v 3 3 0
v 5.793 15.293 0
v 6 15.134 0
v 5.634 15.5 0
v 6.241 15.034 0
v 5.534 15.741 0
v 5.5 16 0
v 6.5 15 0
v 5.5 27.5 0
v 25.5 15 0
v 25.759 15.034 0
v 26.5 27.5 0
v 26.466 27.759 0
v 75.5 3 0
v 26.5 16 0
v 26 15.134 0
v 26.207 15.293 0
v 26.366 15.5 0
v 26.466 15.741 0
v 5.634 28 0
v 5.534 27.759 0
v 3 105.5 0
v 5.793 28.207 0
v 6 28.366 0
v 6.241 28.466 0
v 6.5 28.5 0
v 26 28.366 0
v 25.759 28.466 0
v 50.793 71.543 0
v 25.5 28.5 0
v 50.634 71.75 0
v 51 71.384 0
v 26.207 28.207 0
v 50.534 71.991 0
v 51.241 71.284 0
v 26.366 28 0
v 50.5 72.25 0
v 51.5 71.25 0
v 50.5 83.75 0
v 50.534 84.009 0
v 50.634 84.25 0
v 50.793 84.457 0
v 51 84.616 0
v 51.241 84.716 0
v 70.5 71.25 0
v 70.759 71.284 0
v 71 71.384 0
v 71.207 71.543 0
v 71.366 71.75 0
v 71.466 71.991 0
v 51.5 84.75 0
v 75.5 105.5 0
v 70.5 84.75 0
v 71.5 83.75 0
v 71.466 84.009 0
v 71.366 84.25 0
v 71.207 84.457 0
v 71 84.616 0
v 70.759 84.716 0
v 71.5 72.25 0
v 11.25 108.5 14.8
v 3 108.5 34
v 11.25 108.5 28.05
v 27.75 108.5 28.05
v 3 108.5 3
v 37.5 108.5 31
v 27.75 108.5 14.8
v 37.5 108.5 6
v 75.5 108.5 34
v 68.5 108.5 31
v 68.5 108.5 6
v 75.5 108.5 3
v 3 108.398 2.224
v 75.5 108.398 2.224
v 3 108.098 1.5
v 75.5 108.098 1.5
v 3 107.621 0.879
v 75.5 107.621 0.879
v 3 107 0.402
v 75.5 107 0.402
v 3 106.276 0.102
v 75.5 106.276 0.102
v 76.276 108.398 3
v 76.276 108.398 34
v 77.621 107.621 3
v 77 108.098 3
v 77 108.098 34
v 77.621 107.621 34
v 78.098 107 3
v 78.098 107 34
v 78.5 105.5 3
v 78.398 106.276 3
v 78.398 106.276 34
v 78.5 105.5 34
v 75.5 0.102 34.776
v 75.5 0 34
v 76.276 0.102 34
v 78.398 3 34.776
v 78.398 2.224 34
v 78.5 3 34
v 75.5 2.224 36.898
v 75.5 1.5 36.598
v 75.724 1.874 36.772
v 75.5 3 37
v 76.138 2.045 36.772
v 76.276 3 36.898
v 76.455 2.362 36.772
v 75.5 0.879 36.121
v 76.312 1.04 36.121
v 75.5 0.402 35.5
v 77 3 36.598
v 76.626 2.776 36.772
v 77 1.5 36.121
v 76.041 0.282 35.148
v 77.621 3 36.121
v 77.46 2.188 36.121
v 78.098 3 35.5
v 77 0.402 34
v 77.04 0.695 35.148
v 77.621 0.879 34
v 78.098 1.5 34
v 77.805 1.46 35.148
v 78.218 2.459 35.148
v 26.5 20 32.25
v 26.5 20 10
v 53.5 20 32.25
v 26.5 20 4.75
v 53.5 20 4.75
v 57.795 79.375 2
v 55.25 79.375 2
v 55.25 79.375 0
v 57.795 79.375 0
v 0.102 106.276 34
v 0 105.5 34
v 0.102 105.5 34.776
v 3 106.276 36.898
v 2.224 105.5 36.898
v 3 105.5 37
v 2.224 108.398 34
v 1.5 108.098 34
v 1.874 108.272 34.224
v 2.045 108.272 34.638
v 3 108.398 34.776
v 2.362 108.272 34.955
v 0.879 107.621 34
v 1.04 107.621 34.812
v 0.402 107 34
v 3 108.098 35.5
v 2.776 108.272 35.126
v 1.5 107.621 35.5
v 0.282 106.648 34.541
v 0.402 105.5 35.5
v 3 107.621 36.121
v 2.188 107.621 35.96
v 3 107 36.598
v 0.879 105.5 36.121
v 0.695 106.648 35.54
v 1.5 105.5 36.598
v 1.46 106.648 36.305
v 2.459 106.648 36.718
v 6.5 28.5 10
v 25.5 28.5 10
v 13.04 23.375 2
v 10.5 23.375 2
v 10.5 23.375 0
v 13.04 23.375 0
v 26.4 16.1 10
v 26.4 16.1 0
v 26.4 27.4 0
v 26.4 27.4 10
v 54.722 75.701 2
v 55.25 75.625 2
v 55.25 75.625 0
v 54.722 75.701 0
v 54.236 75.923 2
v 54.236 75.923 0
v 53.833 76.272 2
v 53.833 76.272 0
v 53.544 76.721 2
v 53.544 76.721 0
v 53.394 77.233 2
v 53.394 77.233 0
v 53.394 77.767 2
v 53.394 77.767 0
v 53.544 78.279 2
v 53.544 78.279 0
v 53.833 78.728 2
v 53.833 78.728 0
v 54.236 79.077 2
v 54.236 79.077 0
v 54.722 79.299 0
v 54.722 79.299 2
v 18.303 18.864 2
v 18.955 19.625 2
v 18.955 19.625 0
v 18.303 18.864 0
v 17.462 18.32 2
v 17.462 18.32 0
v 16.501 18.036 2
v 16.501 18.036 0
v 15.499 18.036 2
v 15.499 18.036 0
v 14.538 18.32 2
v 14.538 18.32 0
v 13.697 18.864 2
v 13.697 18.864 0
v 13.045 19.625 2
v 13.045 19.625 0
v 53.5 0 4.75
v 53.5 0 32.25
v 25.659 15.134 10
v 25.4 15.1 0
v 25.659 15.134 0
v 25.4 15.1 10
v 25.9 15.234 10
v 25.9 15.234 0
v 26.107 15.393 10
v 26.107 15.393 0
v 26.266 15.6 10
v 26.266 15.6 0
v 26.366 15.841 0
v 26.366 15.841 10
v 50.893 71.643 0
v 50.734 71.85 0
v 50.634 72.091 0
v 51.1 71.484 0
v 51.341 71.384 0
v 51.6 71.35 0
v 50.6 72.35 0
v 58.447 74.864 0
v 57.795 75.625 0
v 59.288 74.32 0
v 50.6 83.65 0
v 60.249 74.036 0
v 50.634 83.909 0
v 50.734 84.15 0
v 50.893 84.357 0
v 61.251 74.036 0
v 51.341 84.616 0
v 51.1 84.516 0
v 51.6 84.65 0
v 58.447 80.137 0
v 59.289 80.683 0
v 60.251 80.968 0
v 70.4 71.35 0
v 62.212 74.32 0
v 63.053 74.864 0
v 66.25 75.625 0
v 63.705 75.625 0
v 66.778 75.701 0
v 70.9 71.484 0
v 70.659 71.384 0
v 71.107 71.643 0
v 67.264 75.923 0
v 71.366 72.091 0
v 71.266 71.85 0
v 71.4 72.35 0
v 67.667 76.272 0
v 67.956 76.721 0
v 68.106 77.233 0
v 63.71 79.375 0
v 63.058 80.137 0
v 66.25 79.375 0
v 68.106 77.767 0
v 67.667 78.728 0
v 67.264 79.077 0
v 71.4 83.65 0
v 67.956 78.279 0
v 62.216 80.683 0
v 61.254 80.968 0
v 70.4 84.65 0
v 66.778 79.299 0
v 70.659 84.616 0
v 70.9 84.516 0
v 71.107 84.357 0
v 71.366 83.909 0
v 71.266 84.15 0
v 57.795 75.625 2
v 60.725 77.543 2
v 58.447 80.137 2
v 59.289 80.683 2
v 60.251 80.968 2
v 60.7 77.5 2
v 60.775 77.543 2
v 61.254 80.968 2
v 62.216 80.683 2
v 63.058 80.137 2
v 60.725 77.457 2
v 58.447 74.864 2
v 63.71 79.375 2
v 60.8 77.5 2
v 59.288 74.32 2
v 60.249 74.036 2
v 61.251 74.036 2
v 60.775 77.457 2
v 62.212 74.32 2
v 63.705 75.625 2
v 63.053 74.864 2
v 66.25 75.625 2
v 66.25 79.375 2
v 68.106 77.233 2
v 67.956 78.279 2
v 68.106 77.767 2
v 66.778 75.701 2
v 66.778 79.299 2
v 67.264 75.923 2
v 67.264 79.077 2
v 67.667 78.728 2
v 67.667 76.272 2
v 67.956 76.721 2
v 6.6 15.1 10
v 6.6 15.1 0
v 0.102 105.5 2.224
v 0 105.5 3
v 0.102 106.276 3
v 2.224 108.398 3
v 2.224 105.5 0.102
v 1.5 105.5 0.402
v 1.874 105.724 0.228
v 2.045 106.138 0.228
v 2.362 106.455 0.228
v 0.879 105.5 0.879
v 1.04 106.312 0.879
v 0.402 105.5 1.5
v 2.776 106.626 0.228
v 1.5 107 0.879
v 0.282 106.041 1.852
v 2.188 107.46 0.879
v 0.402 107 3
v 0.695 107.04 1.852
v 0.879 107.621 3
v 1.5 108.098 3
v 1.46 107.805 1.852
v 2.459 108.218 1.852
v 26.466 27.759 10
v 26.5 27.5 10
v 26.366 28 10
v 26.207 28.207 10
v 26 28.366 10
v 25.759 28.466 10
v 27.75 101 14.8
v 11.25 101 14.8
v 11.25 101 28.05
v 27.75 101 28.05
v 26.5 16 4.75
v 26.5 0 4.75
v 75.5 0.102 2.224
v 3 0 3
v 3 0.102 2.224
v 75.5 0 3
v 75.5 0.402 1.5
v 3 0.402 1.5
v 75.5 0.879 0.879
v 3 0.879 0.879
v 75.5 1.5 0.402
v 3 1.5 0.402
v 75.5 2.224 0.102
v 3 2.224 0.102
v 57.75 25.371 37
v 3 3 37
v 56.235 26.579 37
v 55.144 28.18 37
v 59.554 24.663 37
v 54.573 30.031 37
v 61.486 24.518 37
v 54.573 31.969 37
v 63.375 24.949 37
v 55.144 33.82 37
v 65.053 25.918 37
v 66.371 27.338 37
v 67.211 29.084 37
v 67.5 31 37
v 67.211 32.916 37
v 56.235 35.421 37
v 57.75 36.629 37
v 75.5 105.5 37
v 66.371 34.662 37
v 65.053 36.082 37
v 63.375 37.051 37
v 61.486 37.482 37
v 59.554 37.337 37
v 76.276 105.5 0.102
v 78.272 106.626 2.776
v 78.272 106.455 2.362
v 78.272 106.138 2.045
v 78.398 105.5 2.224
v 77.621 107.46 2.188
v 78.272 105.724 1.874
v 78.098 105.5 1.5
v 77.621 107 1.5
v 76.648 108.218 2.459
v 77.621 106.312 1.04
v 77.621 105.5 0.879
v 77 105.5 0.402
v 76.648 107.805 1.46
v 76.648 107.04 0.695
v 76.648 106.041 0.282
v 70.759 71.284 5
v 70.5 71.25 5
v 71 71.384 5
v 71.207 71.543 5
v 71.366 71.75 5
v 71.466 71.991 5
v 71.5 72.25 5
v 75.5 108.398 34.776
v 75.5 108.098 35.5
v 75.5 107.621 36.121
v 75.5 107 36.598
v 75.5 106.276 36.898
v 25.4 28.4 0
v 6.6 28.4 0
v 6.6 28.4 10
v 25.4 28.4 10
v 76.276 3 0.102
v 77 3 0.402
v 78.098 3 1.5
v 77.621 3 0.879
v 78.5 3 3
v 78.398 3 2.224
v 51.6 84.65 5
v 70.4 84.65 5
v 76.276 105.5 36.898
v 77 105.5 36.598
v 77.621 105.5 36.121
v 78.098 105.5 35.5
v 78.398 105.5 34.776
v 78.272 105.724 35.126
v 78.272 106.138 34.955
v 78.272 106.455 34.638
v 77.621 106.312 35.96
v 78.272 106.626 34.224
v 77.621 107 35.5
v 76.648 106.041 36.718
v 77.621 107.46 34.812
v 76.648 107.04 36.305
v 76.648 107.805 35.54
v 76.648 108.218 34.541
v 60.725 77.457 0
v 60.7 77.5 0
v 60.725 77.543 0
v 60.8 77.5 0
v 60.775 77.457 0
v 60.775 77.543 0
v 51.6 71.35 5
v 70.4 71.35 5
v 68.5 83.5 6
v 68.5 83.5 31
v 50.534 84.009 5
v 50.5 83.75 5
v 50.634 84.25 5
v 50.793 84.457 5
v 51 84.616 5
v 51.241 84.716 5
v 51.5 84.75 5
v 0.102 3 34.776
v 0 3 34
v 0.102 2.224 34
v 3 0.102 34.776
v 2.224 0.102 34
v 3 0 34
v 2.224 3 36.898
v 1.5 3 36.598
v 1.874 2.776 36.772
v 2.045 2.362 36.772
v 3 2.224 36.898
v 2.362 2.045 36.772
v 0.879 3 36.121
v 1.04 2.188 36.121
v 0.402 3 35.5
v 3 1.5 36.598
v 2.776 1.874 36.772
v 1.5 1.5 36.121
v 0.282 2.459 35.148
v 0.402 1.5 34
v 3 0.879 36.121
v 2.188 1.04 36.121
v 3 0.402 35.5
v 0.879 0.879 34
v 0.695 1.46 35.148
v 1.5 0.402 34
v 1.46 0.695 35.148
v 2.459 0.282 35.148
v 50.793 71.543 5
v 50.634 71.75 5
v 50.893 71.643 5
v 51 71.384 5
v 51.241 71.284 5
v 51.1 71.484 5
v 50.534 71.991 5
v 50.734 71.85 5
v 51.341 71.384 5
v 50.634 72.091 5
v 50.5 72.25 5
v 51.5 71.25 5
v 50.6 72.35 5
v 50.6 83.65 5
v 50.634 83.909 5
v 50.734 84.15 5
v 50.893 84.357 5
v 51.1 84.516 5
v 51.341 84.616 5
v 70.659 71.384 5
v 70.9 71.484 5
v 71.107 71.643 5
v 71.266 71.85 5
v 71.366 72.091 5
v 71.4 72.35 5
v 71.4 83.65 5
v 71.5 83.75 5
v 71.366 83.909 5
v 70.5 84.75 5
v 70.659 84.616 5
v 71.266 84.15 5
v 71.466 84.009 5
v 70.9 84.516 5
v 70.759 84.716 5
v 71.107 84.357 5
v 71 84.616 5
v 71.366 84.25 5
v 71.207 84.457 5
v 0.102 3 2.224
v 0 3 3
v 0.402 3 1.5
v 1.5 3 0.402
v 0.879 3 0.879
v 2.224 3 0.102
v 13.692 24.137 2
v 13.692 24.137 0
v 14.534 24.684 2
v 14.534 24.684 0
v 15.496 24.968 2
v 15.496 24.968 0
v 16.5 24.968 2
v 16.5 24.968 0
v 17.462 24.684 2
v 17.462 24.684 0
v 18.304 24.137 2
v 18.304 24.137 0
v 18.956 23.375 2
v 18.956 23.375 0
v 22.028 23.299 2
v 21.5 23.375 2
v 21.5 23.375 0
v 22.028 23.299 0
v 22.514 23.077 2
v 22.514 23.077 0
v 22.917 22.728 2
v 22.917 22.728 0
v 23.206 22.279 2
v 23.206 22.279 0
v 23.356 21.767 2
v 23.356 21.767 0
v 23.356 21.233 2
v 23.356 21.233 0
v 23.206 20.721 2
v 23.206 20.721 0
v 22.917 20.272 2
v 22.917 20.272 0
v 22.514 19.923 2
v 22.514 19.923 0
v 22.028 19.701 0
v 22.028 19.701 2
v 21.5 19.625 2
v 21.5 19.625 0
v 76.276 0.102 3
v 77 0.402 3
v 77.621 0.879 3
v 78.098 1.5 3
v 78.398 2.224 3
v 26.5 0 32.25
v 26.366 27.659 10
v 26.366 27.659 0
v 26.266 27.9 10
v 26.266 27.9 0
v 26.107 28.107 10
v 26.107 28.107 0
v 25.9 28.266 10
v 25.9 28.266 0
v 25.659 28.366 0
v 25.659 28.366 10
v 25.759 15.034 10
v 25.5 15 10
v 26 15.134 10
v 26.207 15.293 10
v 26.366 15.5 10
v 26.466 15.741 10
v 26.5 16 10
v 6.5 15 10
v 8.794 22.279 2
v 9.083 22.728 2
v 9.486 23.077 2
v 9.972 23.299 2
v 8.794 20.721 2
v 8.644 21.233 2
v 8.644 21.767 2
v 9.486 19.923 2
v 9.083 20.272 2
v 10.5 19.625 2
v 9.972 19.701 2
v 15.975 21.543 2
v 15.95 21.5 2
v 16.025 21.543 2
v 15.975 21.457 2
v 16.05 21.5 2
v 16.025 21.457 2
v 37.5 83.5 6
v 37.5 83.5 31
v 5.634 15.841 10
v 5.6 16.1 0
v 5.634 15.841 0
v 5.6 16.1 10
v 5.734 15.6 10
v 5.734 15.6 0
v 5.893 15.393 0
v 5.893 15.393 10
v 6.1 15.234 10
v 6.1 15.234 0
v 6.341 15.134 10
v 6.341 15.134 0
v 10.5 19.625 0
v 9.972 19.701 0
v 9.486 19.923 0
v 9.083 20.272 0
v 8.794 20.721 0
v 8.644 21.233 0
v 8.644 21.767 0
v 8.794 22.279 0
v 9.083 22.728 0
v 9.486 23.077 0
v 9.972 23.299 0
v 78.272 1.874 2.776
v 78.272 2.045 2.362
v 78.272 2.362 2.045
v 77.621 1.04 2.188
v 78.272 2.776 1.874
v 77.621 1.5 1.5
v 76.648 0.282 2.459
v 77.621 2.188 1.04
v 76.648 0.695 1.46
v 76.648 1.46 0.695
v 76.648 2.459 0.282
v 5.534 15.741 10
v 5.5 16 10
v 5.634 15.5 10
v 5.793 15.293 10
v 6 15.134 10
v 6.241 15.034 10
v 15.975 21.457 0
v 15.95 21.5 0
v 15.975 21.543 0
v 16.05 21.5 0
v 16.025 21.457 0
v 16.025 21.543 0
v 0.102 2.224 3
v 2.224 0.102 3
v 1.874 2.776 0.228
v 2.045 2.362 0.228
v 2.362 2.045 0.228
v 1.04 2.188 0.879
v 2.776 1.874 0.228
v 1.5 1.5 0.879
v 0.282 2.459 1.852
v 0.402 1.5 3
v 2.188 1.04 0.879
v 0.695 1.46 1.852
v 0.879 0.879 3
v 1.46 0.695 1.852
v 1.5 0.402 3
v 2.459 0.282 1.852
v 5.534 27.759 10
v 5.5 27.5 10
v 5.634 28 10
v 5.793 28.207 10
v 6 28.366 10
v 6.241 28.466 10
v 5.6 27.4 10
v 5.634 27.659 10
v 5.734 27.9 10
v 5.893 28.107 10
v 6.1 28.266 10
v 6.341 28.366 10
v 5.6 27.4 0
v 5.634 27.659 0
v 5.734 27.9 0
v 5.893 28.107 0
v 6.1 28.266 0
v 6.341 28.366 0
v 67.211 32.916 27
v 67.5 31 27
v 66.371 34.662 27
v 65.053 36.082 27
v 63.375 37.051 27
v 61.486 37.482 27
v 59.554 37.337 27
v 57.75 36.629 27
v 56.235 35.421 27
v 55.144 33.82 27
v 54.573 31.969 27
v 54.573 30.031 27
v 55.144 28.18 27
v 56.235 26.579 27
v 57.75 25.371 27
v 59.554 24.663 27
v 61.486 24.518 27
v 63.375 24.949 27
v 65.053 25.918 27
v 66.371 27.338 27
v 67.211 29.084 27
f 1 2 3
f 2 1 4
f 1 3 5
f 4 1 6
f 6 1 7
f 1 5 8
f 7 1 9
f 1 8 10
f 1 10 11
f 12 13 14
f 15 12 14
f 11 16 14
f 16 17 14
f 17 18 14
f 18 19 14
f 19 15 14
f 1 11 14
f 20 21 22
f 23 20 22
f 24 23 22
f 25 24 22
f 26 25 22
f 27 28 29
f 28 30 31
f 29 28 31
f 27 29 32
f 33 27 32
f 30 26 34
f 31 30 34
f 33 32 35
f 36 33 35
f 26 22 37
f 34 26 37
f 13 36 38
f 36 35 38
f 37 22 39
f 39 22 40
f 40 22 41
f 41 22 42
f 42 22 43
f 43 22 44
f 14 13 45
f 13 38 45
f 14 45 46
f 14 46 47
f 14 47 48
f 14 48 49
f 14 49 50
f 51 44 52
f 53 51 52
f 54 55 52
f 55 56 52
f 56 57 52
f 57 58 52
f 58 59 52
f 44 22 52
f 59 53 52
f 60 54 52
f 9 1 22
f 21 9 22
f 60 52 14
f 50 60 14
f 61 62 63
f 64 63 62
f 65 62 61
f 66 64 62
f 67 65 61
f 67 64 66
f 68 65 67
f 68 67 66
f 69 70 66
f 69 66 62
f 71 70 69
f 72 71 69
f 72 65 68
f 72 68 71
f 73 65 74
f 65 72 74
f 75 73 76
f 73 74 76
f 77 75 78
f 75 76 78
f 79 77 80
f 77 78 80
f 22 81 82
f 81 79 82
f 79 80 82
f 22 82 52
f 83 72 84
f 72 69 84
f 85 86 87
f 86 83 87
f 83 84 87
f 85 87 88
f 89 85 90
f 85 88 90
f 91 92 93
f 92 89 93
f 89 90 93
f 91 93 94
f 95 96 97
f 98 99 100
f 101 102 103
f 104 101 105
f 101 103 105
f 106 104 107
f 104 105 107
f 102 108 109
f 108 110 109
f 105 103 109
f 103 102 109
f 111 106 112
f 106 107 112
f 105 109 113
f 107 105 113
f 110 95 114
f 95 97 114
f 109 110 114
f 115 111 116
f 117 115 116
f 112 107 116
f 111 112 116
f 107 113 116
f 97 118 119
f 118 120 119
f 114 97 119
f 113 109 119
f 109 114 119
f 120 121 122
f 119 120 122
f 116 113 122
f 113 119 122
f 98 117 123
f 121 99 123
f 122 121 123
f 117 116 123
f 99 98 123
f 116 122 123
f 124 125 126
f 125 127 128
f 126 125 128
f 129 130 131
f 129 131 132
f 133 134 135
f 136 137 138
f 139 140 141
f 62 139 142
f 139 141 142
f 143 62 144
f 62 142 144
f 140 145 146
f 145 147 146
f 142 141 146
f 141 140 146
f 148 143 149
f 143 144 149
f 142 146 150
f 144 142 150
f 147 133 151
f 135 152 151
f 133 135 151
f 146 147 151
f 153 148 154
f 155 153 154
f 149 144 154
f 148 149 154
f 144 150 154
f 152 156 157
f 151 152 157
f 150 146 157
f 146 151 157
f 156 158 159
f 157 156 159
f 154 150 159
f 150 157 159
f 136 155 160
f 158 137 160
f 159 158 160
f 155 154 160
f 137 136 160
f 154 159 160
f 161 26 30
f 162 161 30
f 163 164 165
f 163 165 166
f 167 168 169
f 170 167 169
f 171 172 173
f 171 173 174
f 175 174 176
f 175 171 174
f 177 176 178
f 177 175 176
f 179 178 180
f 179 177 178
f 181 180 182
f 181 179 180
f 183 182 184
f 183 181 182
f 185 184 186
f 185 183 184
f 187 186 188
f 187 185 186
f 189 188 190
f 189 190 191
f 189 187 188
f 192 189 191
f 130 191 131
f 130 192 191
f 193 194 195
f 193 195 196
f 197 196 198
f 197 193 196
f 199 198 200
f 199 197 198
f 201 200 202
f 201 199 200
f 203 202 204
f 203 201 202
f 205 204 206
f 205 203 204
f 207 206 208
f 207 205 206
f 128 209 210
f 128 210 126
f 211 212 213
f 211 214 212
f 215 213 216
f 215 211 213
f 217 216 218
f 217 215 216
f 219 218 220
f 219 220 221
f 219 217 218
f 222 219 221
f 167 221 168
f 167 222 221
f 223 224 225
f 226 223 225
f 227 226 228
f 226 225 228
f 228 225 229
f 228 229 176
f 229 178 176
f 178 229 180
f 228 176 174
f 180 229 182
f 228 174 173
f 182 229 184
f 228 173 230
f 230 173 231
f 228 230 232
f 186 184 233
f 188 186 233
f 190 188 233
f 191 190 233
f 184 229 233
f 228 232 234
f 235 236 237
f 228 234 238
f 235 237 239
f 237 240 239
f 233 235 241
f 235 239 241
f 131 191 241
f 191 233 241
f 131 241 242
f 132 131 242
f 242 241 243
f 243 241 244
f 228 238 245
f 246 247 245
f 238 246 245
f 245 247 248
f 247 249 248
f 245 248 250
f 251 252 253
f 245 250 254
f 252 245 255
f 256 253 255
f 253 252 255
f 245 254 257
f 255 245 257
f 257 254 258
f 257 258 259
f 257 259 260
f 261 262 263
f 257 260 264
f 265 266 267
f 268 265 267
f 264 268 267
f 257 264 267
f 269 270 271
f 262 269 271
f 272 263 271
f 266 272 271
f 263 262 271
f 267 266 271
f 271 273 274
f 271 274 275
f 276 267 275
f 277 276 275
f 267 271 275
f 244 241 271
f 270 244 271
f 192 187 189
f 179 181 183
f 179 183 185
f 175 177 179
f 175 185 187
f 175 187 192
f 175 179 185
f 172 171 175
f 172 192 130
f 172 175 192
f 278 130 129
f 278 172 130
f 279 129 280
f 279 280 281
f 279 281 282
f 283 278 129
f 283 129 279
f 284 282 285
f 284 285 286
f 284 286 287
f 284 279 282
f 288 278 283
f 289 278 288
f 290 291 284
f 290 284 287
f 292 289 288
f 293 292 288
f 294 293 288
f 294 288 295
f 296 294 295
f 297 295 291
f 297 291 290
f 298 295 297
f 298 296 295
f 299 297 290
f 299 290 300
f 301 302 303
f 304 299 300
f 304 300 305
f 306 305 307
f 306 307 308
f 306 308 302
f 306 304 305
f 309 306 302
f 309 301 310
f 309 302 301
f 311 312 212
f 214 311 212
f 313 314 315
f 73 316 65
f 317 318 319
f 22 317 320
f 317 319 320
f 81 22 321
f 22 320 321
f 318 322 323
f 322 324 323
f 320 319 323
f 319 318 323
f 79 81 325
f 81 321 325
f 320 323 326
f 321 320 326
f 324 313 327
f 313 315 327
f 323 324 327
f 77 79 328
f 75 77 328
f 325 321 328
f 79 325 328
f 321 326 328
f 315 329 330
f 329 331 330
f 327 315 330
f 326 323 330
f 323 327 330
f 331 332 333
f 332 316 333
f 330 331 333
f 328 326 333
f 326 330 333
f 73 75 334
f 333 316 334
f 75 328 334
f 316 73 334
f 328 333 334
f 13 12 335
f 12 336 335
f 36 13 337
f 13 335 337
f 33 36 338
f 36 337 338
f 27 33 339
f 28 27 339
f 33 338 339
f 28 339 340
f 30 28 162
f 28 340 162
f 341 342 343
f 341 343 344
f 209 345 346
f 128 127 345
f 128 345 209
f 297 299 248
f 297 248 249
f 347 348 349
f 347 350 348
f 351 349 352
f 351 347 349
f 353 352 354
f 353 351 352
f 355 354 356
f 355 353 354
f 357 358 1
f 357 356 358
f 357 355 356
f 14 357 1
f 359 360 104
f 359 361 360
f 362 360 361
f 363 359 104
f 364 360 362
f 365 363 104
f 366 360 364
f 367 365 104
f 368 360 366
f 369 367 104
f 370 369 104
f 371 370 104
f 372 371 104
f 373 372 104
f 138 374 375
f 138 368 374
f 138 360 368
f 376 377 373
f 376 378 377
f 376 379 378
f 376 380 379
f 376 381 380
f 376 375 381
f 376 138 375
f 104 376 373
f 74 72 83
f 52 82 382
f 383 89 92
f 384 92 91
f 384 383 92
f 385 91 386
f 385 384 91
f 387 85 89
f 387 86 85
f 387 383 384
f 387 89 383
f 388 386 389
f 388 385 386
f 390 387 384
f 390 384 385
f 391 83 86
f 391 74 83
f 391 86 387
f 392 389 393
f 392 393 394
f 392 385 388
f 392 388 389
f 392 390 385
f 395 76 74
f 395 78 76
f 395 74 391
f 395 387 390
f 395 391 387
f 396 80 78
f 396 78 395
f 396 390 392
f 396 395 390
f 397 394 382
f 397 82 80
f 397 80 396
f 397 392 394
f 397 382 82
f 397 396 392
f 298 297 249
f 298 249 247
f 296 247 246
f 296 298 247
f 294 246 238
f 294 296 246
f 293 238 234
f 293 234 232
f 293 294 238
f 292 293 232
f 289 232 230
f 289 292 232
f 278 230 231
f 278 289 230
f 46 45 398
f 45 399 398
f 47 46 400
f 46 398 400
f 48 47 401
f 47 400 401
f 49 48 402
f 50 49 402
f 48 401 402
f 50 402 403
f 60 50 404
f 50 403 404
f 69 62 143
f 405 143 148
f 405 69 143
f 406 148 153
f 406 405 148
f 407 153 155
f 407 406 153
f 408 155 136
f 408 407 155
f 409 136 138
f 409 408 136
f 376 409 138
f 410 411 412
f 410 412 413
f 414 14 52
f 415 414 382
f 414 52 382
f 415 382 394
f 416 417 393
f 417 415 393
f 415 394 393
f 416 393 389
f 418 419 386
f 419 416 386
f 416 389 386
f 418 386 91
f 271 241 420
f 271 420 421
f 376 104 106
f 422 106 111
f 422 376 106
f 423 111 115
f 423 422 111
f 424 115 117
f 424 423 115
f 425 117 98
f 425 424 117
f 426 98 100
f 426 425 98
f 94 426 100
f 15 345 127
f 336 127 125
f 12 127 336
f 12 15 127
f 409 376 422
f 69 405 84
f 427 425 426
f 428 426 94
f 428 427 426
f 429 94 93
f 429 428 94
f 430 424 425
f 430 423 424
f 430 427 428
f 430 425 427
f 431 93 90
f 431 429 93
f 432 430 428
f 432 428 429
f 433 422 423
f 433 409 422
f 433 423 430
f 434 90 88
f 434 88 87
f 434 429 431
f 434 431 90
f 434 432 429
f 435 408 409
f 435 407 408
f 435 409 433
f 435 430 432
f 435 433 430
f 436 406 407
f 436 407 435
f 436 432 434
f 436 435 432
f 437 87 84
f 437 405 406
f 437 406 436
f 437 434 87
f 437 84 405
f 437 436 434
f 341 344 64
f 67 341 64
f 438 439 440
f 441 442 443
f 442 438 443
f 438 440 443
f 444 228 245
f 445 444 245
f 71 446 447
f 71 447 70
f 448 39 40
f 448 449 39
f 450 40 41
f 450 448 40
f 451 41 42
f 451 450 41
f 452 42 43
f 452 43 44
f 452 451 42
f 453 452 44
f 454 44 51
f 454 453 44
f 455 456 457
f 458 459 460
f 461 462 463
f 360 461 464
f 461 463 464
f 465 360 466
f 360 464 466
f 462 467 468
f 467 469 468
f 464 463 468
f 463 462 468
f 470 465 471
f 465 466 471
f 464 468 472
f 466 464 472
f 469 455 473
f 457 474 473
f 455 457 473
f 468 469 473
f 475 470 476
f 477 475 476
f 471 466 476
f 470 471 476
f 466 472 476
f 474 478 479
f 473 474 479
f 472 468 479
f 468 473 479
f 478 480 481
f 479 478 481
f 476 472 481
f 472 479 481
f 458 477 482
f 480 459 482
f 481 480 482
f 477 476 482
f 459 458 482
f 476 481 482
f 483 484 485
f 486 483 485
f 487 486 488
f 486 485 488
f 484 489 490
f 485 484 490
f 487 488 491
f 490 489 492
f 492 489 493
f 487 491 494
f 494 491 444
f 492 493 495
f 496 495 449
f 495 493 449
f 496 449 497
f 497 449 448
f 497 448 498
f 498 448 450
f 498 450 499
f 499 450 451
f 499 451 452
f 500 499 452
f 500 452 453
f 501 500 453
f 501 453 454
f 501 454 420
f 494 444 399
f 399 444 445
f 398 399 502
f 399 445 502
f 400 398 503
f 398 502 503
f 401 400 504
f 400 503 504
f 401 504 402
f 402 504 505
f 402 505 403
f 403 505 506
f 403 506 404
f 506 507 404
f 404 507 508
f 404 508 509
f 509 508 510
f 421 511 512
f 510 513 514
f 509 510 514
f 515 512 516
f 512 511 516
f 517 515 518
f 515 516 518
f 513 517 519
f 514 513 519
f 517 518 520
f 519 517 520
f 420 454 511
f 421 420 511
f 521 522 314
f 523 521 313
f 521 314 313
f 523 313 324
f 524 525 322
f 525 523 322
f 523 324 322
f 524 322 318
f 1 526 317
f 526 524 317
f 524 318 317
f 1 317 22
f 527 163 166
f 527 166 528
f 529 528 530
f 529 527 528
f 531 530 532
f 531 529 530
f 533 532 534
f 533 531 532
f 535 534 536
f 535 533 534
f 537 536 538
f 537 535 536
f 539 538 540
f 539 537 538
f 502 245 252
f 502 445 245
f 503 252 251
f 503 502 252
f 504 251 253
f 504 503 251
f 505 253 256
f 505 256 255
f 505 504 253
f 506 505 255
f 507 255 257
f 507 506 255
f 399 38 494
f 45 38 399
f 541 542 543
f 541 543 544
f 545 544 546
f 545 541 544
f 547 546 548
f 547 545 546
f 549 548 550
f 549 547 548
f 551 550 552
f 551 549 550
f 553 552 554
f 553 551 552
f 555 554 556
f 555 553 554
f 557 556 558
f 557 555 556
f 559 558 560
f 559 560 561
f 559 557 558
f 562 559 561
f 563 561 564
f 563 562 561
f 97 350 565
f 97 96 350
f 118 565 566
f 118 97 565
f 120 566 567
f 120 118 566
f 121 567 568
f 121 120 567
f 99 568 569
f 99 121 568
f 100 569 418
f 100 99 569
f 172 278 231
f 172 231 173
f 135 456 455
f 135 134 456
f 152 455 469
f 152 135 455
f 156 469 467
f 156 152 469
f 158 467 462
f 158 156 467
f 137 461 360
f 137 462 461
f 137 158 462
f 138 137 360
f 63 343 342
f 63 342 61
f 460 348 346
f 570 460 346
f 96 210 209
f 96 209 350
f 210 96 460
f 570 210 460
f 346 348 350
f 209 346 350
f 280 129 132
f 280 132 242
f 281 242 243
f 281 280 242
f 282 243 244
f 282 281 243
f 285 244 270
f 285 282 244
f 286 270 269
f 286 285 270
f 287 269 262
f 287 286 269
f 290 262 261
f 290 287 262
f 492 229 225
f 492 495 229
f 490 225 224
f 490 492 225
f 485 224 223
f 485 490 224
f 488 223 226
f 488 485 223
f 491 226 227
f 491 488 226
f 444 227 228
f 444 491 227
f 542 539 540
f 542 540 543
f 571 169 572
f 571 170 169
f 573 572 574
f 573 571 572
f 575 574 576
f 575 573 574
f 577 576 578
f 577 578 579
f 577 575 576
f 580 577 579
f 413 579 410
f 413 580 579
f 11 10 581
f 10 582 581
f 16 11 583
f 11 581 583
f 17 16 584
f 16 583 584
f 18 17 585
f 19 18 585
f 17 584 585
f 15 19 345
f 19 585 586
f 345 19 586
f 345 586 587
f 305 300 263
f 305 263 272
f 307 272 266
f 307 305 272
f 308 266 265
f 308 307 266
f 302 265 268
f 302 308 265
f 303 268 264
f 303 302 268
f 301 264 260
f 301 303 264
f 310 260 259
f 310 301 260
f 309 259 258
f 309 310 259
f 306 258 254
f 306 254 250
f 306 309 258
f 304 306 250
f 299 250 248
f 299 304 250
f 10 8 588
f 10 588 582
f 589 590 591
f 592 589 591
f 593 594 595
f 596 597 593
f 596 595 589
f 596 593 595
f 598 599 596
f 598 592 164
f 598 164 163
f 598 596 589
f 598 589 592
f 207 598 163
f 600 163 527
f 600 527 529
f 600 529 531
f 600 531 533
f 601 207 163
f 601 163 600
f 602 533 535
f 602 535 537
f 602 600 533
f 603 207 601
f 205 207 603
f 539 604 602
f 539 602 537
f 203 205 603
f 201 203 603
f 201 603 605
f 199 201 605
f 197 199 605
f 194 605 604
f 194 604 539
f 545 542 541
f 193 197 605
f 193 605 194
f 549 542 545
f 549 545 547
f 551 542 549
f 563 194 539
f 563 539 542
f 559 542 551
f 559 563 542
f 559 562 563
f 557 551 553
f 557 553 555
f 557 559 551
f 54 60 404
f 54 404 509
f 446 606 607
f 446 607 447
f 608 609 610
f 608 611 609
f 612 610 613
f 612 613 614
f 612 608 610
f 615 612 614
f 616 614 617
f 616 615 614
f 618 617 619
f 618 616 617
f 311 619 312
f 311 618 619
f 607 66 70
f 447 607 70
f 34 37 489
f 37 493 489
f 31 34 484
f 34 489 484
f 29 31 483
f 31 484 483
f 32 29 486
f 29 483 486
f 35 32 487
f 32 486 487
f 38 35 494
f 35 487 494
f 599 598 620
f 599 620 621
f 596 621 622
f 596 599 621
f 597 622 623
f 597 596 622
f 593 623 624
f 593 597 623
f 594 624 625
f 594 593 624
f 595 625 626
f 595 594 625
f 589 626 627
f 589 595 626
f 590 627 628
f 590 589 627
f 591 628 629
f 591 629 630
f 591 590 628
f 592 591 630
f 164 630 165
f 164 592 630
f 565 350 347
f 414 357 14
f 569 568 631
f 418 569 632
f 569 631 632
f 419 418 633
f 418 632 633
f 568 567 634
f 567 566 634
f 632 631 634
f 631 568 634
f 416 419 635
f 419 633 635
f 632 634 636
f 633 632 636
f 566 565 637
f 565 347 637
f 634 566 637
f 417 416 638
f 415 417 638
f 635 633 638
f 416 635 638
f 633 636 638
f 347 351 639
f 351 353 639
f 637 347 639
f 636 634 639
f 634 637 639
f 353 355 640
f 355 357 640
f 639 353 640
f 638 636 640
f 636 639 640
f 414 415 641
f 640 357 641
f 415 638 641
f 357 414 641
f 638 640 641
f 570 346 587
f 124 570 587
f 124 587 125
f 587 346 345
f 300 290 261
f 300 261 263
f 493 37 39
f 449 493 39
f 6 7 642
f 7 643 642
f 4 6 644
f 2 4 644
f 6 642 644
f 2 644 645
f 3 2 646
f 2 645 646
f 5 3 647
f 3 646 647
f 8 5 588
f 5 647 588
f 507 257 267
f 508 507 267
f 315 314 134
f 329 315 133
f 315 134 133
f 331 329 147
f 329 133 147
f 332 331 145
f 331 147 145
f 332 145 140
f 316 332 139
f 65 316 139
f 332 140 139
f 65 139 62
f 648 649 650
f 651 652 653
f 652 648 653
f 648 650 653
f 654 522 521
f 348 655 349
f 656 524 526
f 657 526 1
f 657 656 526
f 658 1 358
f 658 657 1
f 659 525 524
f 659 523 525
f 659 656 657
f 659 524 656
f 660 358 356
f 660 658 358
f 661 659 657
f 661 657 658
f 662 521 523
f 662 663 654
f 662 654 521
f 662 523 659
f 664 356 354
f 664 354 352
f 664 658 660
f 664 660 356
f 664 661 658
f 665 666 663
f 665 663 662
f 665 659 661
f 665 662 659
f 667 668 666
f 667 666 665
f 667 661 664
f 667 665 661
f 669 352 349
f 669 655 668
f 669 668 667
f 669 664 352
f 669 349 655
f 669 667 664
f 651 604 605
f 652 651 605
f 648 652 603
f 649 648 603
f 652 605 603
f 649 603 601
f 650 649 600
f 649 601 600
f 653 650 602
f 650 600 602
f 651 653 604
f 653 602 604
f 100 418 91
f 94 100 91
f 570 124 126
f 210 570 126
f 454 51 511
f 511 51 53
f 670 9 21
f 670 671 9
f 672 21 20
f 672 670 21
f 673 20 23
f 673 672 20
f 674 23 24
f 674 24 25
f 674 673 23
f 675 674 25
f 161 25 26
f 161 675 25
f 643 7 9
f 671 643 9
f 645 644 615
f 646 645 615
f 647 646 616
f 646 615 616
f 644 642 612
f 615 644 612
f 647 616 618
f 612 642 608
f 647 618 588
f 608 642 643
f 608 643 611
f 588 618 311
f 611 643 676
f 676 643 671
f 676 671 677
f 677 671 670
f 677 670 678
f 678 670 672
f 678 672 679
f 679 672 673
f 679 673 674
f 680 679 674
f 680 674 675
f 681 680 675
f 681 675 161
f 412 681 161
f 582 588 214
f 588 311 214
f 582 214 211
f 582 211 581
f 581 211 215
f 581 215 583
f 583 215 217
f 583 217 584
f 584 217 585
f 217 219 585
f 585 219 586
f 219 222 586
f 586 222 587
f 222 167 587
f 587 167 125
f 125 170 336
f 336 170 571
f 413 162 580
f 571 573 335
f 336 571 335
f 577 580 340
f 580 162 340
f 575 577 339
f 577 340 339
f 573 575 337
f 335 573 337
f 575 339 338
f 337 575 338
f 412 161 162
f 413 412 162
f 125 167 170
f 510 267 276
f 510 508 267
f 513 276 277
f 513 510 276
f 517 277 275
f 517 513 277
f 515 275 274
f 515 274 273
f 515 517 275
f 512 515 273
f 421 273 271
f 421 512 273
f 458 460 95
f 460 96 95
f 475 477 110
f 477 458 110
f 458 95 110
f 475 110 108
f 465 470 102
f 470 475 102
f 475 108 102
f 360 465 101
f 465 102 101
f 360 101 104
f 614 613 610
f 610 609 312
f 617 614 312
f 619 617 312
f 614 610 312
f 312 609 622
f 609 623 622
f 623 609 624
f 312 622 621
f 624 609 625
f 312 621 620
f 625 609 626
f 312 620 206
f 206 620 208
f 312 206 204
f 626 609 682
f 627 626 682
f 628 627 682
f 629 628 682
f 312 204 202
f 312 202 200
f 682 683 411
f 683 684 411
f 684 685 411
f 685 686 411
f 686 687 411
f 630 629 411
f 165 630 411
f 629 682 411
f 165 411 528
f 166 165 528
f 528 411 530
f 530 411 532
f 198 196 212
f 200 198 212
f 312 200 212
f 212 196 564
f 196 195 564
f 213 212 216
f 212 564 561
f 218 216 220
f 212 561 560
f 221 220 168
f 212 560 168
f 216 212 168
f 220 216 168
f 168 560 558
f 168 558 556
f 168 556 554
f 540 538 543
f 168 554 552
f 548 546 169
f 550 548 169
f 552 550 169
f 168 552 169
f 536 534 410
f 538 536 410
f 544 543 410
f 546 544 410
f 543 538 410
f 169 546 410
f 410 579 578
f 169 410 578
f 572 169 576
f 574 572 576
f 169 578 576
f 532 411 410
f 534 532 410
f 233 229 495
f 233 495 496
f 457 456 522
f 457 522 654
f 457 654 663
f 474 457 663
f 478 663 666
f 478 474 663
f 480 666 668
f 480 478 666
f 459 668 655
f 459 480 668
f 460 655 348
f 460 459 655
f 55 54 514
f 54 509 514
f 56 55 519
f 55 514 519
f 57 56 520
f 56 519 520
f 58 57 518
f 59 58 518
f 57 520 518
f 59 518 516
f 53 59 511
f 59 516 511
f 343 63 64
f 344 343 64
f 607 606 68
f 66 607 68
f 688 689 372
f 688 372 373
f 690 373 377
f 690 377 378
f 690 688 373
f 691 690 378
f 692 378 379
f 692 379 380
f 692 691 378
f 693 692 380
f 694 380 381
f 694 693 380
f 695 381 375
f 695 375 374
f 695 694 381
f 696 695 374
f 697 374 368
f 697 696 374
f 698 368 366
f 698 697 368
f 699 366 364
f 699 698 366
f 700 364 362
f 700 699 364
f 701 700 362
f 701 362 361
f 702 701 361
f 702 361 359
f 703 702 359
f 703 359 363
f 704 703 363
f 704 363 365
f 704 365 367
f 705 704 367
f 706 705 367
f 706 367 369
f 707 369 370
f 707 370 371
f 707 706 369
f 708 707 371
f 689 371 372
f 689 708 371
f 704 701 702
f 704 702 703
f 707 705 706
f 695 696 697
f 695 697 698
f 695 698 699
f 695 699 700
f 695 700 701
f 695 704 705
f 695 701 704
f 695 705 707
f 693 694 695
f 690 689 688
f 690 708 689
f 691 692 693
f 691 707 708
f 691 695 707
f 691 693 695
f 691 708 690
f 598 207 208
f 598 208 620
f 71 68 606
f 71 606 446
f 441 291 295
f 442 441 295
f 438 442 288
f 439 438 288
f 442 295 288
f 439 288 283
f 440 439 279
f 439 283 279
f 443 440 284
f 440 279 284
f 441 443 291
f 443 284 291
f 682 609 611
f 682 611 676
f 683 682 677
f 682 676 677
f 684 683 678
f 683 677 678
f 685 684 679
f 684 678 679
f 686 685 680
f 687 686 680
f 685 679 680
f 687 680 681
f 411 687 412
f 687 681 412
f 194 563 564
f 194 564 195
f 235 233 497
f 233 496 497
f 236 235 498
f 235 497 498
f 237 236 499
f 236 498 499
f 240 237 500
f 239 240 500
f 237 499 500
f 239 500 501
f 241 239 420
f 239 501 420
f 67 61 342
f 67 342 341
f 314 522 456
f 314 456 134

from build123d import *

# Parameters (mm, degrees)
SKETCH001_R       = 0.05
EXTRUDE001_DEPTH  = 2
BOX017_W          = 21
BOX017_H          = 13.5
BOX017_DEPTH      = 5
FILLET006_R       = 1
BOX007_W          = 21
BOX007_H          = 13.5
BOX007_DEPTH      = 10
FILLET004_R       = 1
BOX006_W          = 16.5
BOX006_H          = 10
BOX006_DEPTH      = 13.25
BOX005_W          = 31
BOX005_H          = 27
BOX005_DEPTH      = 25
CYLINDER004_R     = 6.5
CYLINDER004_DEPTH = 10
BOX014_W          = 27
BOX014_H          = 20
BOX014_DEPTH      = 27.5
BOX013_W          = 78.5
BOX013_H          = 108.5
BOX013_DEPTH      = 37
FILLET003_R       = 3
BOX018_W          = 20.8
BOX018_H          = 13.3
BOX018_DEPTH      = 5
FILLET007_R       = 1
BOX016_W          = 20.8
BOX016_H          = 13.3
BOX016_DEPTH      = 10
FILLET005_R       = 1


with BuildPart() as extrude001:
    # Sketch001 → Extrude001 (new body)
    with BuildSketch(Plane(origin=(0, 0, 0), x_dir=(1, 0, 0), z_dir=(0, 0, -1))):
        with BuildLine():
            ThreePointArc((10.5, -19.625), (8.625, -21.5), (10.5, -23.375))
            Line((10.5, -23.375), (13.04, -23.375))
            ThreePointArc((13.04, -23.375), (15.998193, -25.004413), (18.956385, -23.375))
            Line((18.956385, -23.375), (21.5, -23.375))
            ThreePointArc((21.5, -23.375), (23.375, -21.5), (21.5, -19.625))
            Line((21.5, -19.625), (18.955398, -19.625))
            ThreePointArc((18.955398, -19.625), (16, -18), (13.044602, -19.625))
            Line((13.044602, -19.625), (10.5, -19.625))
        make_face()
        with Locations((16, -21.5)):
            Circle(SKETCH001_R, mode=Mode.SUBTRACT)
        with BuildLine():
            ThreePointArc((55.25, -75.625), (53.375, -77.5), (55.25, -79.375))
            Line((55.25, -79.375), (57.794602, -79.375))
            ThreePointArc((57.794602, -79.375), (60.752301, -81.003632), (63.71, -79.375))
            Line((63.71, -79.375), (66.25, -79.375))
            ThreePointArc((66.25, -79.375), (68.125, -77.5), (66.25, -75.625))
            Line((66.25, -75.625), (63.705398, -75.625))
            ThreePointArc((63.705398, -75.625), (60.75, -74), (57.794602, -75.625))
            Line((57.794602, -75.625), (55.25, -75.625))
        make_face()
        with Locations((60.75, -77.5)):
            Circle(SKETCH001_R, mode=Mode.SUBTRACT)
    extrude(amount=EXTRUDE001_DEPTH)


with BuildPart() as extrude001_1:
    # Extrude001 placement: moved
    add(extrude001.part.moved(Location((0, 0, 2))))


with BuildPart() as key_hole001:
    # Box017 → Box017 (new body)
    with BuildSketch(Plane(origin=(5.5, 13.5, 0), x_dir=(1, 0, 0), z_dir=(0, 0, 1))):
        with Locations((10.5, 6.75)):
            Rectangle(BOX017_W, BOX017_H)
    extrude(amount=BOX017_DEPTH)

    # Fillet006
    fillet006_edges = [key_hole001.edges().sort_by_distance(p)[0] for p in [
        (5.5, 13.5, 2.5),
        (5.5, 27, 2.5),
        (26.5, 13.5, 2.5),
        (26.5, 27, 2.5),
    ]]
    fillet(fillet006_edges, radius=FILLET006_R)


with BuildPart() as key_hole001_1:
    # Fillet006 placement: moved
    add(key_hole001.part.moved(Location((45, 57.75, 0))))


with BuildPart() as key_hole:
    # Box007 → Box007 (new body)
    with BuildSketch(Plane(origin=(5.5, 15, 0), x_dir=(1, 0, 0), z_dir=(0, 0, 1))):
        with Locations((10.5, 6.75)):
            Rectangle(BOX007_W, BOX007_H)
    extrude(amount=BOX007_DEPTH)

    # Fillet004
    fillet004_edges = [key_hole.edges().sort_by_distance(p)[0] for p in [
        (5.5, 15, 5),
        (5.5, 28.5, 5),
        (26.5, 15, 5),
        (26.5, 28.5, 5),
    ]]
    fillet(fillet004_edges, radius=FILLET004_R)


with BuildPart() as lan_cube:
    # Box006 → Box006 (new body)
    with BuildSketch(Plane(origin=(11.25, 101, 14.8), x_dir=(1, 0, 0), z_dir=(0, 0, 1))):
        with Locations((8.25, 5)):
            Rectangle(BOX006_W, BOX006_H)
    extrude(amount=BOX006_DEPTH)


with BuildPart() as cube009:
    # Box005 → Box005 (new body)
    with BuildSketch(Plane(origin=(37.5, 83.5, 6), x_dir=(1, 0, 0), z_dir=(0, 0, 1))):
        with Locations((15.5, 13.5)):
            Rectangle(BOX005_W, BOX005_H)
    extrude(amount=BOX005_DEPTH)


with BuildPart() as cylinder004:
    # Cylinder004 → Cylinder004 (new body)
    with BuildSketch(Plane(origin=(61, 31, 27), x_dir=(1, 0, 0), z_dir=(0, 0, 1))):
        Circle(CYLINDER004_R)
    extrude(amount=CYLINDER004_DEPTH)


with BuildPart() as cube001:
    # Box014 → Box014 (new body)
    with BuildSketch(Plane(origin=(26.5, 0, 4.75), x_dir=(1, 0, 0), z_dir=(0, 0, 1))):
        with Locations((13.5, 10)):
            Rectangle(BOX014_W, BOX014_H)
    extrude(amount=BOX014_DEPTH)


with BuildPart() as hole2:
    # Box013 → Box013 (new body)
    with BuildSketch(Plane.XY):
        with Locations((39.25, 54.25)):
            Rectangle(BOX013_W, BOX013_H)
    extrude(amount=BOX013_DEPTH)

    # Cut001: cut Cube001
    add(cube001.part, mode=Mode.SUBTRACT)

    # Cut002: cut Cylinder004
    add(cylinder004.part, mode=Mode.SUBTRACT)

    # Cut006: cut Cube009
    add(cube009.part, mode=Mode.SUBTRACT)

    # Cut007: cut lan_cube
    add(lan_cube.part, mode=Mode.SUBTRACT)

    # Fillet003
    fillet003_edges = [hole2.edges().sort_by_distance(p)[0] for p in [
        (0, 0, 18.5),
        (0, 54.25, 37),
        (0, 108.5, 18.5),
        (0, 54.25, 0),
        (39.25, 0, 0),
        (78.5, 0, 18.5),
        (39.25, 0, 37),
        (39.25, 108.5, 37),
        (78.5, 54.25, 37),
        (39.25, 108.5, 0),
        (78.5, 108.5, 18.5),
        (78.5, 54.25, 0),
    ]]
    fillet(fillet003_edges, radius=FILLET003_R)

    # Cut008: cut Key_hole
    add(key_hole.part, mode=Mode.SUBTRACT)

    # Cut009: cut Key_hole001
    add(key_hole001_1.part, mode=Mode.SUBTRACT)


with BuildPart() as key_hole002:
    # Box018 → Box018 (new body)
    with BuildSketch(Plane(origin=(5.5, 13.5, 0), x_dir=(1, 0, 0), z_dir=(0, 0, 1))):
        with Locations((10.4, 6.65)):
            Rectangle(BOX018_W, BOX018_H)
    extrude(amount=BOX018_DEPTH)

    # Fillet007
    fillet007_edges = [key_hole002.edges().sort_by_distance(p)[0] for p in [
        (5.5, 13.5, 2.5),
        (5.5, 26.8, 2.5),
        (26.3, 13.5, 2.5),
        (26.3, 26.8, 2.5),
    ]]
    fillet(fillet007_edges, radius=FILLET007_R)


with BuildPart() as key_hole002_1:
    # Fillet007 placement: moved
    add(key_hole002.part.moved(Location((45.1, 57.85, 0))))


with BuildPart() as cut010:
    # Box016 → Box016 (new body)
    with BuildSketch(Plane(origin=(5.6, 15.1, 0), x_dir=(1, 0, 0), z_dir=(0, 0, 1))):
        with Locations((10.4, 6.65)):
            Rectangle(BOX016_W, BOX016_H)
    extrude(amount=BOX016_DEPTH)

    # Fillet005
    fillet005_edges = [cut010.edges().sort_by_distance(p)[0] for p in [
        (5.6, 15.1, 5),
        (5.6, 28.4, 5),
        (26.4, 15.1, 5),
        (26.4, 28.4, 5),
    ]]
    fillet(fillet005_edges, radius=FILLET005_R)

    # Fusion007: union Hole2, Key_hole002
    add(hole2.part)
    add(key_hole002_1.part)

    # Cut010: cut Extrude001
    add(extrude001_1.part, mode=Mode.SUBTRACT)


solid = cut010.part
